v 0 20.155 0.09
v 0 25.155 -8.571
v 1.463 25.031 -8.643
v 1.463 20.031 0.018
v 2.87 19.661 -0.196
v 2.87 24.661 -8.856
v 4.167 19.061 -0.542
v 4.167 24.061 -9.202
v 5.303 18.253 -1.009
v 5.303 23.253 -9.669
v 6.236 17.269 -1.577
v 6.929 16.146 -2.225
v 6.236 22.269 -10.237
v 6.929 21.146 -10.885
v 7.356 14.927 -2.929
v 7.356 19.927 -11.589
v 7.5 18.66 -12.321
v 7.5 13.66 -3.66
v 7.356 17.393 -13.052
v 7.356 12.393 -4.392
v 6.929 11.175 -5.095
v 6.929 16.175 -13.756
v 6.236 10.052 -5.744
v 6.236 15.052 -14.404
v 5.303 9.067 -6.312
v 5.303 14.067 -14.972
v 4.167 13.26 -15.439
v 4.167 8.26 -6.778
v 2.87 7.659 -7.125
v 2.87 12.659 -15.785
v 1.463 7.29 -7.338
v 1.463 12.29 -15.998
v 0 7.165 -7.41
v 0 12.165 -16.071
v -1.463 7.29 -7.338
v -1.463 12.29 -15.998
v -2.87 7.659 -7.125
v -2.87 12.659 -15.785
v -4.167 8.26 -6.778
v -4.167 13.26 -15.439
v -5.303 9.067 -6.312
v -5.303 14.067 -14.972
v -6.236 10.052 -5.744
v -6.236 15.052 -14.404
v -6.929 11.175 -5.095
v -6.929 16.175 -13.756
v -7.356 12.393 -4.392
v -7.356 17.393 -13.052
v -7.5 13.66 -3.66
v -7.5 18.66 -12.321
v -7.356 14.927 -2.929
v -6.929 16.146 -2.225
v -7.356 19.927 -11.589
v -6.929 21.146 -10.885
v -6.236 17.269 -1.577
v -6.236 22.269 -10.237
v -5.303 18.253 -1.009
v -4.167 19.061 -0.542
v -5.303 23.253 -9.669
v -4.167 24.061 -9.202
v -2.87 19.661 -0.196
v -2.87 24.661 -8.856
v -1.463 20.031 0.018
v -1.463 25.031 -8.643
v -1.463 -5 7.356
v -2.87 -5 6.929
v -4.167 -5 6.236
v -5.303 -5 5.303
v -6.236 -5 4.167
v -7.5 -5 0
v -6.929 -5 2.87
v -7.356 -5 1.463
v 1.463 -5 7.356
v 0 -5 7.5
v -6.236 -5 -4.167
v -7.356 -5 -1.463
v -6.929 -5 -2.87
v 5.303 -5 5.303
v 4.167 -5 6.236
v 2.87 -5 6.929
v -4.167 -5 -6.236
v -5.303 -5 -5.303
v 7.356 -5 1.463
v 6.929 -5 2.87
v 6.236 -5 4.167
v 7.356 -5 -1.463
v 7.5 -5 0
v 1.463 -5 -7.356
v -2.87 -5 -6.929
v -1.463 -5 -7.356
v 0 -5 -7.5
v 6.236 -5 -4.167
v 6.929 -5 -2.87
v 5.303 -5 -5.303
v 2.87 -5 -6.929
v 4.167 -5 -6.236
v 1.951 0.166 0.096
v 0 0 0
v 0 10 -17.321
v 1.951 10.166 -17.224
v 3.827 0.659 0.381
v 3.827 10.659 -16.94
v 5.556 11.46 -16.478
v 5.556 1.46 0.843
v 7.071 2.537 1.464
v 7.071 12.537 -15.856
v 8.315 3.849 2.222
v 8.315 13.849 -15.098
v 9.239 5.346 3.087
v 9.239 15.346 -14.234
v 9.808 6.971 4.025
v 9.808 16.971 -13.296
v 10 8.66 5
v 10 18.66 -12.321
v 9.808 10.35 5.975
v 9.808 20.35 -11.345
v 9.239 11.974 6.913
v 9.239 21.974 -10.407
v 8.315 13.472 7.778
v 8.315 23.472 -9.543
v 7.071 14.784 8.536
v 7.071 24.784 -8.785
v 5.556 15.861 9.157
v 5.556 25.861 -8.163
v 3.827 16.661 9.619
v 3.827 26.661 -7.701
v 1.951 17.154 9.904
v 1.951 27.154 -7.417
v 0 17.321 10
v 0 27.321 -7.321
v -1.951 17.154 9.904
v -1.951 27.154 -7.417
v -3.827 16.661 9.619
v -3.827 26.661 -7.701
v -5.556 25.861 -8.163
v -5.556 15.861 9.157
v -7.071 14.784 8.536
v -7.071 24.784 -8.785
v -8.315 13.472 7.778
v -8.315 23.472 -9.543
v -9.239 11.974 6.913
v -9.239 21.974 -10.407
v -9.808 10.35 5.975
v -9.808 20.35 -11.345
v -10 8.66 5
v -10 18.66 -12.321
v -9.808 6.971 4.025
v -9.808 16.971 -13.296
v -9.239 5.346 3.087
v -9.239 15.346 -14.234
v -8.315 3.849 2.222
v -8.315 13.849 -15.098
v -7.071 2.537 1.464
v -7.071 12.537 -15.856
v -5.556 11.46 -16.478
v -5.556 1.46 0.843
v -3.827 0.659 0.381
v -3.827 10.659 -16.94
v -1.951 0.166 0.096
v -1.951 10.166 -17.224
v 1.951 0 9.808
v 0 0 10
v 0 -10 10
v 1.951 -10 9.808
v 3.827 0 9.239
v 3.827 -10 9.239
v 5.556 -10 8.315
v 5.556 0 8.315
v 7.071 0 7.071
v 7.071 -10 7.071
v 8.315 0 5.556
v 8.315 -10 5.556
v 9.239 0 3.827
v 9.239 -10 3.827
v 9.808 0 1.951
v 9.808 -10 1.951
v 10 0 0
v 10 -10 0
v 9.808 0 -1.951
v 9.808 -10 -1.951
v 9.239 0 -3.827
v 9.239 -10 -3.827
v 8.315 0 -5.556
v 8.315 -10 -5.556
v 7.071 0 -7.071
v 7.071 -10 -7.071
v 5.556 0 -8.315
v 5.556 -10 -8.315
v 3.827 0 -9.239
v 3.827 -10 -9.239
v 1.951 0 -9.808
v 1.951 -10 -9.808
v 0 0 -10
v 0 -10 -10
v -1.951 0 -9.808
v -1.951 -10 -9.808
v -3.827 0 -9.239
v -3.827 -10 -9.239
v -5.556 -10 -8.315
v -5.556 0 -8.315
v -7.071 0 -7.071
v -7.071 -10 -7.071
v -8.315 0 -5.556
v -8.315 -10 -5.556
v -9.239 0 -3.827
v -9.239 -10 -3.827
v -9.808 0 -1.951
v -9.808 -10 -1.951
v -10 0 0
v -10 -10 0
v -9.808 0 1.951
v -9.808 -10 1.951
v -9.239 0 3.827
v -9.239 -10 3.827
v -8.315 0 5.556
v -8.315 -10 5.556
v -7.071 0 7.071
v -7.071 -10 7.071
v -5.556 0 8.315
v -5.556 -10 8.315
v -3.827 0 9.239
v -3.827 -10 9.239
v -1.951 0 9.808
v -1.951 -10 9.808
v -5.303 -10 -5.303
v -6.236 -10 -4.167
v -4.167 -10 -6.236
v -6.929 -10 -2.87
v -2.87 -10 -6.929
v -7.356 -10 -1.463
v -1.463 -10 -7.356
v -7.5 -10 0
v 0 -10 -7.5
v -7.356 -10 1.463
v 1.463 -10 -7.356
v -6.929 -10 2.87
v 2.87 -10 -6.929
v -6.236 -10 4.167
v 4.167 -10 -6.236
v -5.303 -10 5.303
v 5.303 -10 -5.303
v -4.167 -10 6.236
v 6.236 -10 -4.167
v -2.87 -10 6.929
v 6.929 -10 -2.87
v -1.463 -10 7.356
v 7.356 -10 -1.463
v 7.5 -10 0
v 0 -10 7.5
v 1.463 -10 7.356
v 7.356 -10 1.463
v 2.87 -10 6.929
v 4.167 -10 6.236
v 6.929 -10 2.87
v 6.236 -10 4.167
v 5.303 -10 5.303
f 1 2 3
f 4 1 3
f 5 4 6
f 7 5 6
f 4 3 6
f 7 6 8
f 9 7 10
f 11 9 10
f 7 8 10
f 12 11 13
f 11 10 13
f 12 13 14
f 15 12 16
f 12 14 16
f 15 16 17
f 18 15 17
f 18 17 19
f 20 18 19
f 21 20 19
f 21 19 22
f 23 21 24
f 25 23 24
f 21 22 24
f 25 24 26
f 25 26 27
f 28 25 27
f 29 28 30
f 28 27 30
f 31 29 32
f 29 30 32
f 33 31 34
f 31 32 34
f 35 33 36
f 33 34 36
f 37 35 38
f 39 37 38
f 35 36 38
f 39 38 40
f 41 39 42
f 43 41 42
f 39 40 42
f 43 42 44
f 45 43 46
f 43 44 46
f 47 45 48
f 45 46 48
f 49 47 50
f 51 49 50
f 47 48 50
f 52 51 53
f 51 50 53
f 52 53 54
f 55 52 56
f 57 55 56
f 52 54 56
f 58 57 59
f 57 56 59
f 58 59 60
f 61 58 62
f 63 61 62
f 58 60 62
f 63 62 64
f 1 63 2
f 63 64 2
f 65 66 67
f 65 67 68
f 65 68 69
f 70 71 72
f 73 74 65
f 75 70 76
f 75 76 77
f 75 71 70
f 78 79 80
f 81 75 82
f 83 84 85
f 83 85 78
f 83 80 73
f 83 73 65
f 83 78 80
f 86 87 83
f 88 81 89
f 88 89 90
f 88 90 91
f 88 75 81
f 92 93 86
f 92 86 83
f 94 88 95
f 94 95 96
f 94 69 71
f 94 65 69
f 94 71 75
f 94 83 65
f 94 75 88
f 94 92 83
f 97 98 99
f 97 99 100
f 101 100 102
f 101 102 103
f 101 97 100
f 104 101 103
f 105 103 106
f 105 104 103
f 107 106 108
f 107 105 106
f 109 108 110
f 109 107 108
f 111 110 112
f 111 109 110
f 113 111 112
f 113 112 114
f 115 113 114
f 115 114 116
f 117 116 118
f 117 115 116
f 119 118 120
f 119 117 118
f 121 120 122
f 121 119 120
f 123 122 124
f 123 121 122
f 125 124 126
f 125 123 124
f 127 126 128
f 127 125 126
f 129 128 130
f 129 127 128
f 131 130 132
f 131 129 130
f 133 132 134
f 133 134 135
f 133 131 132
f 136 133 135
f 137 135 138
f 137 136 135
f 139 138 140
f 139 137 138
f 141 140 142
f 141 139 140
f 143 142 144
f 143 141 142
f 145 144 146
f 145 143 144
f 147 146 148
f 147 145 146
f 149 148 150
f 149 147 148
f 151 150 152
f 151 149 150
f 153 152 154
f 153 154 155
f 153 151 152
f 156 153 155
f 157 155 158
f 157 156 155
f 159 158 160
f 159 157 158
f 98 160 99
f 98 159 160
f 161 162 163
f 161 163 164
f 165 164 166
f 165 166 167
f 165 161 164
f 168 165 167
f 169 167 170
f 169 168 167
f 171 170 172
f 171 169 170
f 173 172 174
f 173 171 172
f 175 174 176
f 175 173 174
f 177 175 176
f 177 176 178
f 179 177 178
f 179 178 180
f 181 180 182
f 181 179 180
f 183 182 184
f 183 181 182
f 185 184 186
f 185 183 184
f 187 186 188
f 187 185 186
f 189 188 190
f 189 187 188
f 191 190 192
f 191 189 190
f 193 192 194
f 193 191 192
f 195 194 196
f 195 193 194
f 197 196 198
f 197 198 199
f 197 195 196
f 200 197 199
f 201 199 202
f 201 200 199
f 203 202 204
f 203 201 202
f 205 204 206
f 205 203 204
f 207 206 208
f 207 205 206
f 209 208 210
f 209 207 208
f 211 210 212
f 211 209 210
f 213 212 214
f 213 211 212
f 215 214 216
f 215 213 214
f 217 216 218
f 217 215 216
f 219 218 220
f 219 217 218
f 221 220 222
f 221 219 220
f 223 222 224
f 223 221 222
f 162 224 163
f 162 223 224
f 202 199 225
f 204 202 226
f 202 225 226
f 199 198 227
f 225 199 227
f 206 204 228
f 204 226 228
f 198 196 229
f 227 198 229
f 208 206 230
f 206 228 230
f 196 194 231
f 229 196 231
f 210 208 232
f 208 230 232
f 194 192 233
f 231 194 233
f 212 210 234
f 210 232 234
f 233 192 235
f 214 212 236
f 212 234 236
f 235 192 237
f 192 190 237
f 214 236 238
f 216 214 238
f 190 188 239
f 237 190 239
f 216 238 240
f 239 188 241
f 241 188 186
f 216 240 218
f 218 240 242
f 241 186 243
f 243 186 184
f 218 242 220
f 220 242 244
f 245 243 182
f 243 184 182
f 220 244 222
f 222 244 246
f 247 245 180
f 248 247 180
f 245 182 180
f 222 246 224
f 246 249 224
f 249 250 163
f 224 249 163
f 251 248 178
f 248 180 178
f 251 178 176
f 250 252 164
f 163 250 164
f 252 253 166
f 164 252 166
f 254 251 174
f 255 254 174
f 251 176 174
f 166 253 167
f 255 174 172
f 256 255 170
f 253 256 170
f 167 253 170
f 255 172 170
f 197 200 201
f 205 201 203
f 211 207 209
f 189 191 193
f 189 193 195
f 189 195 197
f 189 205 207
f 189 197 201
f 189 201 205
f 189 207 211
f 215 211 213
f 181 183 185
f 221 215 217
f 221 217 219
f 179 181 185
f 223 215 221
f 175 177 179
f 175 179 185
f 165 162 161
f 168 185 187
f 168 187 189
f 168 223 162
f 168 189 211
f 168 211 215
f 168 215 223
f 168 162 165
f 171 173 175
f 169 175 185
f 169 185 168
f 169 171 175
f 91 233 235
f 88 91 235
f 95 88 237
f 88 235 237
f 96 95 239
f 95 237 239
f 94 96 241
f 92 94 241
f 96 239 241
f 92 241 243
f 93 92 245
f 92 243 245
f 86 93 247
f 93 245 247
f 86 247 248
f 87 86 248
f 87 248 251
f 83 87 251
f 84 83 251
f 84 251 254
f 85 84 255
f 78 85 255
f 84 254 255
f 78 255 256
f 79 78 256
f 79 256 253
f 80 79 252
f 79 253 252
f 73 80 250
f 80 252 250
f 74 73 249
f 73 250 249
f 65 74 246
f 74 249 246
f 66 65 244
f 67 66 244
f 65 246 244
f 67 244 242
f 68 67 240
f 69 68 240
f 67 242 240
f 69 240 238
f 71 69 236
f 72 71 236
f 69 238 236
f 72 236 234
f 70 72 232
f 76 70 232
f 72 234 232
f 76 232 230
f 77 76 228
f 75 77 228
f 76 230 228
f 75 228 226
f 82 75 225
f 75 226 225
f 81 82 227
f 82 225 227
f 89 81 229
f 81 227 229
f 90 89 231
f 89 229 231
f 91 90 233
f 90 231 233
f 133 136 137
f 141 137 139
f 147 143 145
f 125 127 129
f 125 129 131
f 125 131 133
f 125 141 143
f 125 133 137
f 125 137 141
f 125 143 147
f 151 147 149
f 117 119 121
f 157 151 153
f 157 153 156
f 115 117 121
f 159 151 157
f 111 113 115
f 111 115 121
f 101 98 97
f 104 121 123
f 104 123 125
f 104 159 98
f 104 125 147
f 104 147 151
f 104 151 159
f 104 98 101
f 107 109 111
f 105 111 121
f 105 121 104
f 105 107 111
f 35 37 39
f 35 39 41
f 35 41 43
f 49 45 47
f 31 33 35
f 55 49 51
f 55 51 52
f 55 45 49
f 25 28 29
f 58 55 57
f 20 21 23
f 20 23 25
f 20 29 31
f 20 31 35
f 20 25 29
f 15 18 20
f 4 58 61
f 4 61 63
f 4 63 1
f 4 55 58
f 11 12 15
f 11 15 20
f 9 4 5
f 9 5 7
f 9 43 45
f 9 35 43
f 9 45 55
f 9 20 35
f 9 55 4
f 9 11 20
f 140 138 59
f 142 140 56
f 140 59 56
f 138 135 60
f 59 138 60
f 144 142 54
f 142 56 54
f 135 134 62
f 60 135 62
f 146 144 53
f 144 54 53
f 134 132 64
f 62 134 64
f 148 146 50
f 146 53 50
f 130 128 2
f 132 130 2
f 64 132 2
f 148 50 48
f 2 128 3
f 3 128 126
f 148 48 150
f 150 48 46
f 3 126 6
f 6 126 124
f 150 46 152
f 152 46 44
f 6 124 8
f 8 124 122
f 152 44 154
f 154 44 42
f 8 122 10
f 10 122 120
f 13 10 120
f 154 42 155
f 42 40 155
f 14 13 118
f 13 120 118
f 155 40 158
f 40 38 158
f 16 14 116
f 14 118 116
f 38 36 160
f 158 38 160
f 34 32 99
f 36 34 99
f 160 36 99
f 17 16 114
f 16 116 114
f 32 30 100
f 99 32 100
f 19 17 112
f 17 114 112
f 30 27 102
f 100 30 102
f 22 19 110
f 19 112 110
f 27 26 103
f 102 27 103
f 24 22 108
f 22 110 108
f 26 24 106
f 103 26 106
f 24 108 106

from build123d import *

# Parameters (mm, degrees)
SKETCH1_R           = 10
BOSS_EXTRUDE1_DEPTH = 10
SKETCH2_R           = 7.5
CUT_EXTRUDE1_DEPTH  = 5
SKETCH4_R           = 10
BOSS_EXTRUDE2_DEPTH = 20
SKETCH5_R           = 7.5
CUT_EXTRUDE2_DEPTH  = 10


with BuildPart() as part:
    # Sketch1 → Boss-Extrude1 (new body)
    with BuildSketch(Plane(origin=(0, 0, 0), x_dir=(1, 0, 0), z_dir=(0, 1, 0))):
        Circle(SKETCH1_R)
    extrude(amount=-BOSS_EXTRUDE1_DEPTH)

    # Sketch2 → Cut-Extrude1 (cut)
    with BuildSketch(Plane(origin=(0, -10, 0), x_dir=(-1, 0, 0), z_dir=(0, -1, 0))):
        Circle(SKETCH2_R)
    extrude(amount=-CUT_EXTRUDE1_DEPTH, mode=Mode.SUBTRACT)


with BuildPart() as body_2:
    # Sketch4 → Boss-Extrude2 (new body)
    with BuildSketch(Plane(origin=(0, 0, 0), x_dir=(1, 0, 0), z_dir=(0, -0.500000000000001, 0.866025403784438))):
        with Locations((0, 10)):
            Circle(SKETCH4_R)
    extrude(amount=-BOSS_EXTRUDE2_DEPTH)

    # Sketch5 → Cut-Extrude2 (cut)
    with BuildSketch(Plane(origin=(0, 10, -17.320508076), x_dir=(-1, 0, 0), z_dir=(0, 0.500000000000001, -0.8660254037844382))):
        with Locations((0, 10)):
            Circle(SKETCH5_R)
    extrude(amount=-CUT_EXTRUDE2_DEPTH, mode=Mode.SUBTRACT)


solid = Compound([part.part, body_2.part])
